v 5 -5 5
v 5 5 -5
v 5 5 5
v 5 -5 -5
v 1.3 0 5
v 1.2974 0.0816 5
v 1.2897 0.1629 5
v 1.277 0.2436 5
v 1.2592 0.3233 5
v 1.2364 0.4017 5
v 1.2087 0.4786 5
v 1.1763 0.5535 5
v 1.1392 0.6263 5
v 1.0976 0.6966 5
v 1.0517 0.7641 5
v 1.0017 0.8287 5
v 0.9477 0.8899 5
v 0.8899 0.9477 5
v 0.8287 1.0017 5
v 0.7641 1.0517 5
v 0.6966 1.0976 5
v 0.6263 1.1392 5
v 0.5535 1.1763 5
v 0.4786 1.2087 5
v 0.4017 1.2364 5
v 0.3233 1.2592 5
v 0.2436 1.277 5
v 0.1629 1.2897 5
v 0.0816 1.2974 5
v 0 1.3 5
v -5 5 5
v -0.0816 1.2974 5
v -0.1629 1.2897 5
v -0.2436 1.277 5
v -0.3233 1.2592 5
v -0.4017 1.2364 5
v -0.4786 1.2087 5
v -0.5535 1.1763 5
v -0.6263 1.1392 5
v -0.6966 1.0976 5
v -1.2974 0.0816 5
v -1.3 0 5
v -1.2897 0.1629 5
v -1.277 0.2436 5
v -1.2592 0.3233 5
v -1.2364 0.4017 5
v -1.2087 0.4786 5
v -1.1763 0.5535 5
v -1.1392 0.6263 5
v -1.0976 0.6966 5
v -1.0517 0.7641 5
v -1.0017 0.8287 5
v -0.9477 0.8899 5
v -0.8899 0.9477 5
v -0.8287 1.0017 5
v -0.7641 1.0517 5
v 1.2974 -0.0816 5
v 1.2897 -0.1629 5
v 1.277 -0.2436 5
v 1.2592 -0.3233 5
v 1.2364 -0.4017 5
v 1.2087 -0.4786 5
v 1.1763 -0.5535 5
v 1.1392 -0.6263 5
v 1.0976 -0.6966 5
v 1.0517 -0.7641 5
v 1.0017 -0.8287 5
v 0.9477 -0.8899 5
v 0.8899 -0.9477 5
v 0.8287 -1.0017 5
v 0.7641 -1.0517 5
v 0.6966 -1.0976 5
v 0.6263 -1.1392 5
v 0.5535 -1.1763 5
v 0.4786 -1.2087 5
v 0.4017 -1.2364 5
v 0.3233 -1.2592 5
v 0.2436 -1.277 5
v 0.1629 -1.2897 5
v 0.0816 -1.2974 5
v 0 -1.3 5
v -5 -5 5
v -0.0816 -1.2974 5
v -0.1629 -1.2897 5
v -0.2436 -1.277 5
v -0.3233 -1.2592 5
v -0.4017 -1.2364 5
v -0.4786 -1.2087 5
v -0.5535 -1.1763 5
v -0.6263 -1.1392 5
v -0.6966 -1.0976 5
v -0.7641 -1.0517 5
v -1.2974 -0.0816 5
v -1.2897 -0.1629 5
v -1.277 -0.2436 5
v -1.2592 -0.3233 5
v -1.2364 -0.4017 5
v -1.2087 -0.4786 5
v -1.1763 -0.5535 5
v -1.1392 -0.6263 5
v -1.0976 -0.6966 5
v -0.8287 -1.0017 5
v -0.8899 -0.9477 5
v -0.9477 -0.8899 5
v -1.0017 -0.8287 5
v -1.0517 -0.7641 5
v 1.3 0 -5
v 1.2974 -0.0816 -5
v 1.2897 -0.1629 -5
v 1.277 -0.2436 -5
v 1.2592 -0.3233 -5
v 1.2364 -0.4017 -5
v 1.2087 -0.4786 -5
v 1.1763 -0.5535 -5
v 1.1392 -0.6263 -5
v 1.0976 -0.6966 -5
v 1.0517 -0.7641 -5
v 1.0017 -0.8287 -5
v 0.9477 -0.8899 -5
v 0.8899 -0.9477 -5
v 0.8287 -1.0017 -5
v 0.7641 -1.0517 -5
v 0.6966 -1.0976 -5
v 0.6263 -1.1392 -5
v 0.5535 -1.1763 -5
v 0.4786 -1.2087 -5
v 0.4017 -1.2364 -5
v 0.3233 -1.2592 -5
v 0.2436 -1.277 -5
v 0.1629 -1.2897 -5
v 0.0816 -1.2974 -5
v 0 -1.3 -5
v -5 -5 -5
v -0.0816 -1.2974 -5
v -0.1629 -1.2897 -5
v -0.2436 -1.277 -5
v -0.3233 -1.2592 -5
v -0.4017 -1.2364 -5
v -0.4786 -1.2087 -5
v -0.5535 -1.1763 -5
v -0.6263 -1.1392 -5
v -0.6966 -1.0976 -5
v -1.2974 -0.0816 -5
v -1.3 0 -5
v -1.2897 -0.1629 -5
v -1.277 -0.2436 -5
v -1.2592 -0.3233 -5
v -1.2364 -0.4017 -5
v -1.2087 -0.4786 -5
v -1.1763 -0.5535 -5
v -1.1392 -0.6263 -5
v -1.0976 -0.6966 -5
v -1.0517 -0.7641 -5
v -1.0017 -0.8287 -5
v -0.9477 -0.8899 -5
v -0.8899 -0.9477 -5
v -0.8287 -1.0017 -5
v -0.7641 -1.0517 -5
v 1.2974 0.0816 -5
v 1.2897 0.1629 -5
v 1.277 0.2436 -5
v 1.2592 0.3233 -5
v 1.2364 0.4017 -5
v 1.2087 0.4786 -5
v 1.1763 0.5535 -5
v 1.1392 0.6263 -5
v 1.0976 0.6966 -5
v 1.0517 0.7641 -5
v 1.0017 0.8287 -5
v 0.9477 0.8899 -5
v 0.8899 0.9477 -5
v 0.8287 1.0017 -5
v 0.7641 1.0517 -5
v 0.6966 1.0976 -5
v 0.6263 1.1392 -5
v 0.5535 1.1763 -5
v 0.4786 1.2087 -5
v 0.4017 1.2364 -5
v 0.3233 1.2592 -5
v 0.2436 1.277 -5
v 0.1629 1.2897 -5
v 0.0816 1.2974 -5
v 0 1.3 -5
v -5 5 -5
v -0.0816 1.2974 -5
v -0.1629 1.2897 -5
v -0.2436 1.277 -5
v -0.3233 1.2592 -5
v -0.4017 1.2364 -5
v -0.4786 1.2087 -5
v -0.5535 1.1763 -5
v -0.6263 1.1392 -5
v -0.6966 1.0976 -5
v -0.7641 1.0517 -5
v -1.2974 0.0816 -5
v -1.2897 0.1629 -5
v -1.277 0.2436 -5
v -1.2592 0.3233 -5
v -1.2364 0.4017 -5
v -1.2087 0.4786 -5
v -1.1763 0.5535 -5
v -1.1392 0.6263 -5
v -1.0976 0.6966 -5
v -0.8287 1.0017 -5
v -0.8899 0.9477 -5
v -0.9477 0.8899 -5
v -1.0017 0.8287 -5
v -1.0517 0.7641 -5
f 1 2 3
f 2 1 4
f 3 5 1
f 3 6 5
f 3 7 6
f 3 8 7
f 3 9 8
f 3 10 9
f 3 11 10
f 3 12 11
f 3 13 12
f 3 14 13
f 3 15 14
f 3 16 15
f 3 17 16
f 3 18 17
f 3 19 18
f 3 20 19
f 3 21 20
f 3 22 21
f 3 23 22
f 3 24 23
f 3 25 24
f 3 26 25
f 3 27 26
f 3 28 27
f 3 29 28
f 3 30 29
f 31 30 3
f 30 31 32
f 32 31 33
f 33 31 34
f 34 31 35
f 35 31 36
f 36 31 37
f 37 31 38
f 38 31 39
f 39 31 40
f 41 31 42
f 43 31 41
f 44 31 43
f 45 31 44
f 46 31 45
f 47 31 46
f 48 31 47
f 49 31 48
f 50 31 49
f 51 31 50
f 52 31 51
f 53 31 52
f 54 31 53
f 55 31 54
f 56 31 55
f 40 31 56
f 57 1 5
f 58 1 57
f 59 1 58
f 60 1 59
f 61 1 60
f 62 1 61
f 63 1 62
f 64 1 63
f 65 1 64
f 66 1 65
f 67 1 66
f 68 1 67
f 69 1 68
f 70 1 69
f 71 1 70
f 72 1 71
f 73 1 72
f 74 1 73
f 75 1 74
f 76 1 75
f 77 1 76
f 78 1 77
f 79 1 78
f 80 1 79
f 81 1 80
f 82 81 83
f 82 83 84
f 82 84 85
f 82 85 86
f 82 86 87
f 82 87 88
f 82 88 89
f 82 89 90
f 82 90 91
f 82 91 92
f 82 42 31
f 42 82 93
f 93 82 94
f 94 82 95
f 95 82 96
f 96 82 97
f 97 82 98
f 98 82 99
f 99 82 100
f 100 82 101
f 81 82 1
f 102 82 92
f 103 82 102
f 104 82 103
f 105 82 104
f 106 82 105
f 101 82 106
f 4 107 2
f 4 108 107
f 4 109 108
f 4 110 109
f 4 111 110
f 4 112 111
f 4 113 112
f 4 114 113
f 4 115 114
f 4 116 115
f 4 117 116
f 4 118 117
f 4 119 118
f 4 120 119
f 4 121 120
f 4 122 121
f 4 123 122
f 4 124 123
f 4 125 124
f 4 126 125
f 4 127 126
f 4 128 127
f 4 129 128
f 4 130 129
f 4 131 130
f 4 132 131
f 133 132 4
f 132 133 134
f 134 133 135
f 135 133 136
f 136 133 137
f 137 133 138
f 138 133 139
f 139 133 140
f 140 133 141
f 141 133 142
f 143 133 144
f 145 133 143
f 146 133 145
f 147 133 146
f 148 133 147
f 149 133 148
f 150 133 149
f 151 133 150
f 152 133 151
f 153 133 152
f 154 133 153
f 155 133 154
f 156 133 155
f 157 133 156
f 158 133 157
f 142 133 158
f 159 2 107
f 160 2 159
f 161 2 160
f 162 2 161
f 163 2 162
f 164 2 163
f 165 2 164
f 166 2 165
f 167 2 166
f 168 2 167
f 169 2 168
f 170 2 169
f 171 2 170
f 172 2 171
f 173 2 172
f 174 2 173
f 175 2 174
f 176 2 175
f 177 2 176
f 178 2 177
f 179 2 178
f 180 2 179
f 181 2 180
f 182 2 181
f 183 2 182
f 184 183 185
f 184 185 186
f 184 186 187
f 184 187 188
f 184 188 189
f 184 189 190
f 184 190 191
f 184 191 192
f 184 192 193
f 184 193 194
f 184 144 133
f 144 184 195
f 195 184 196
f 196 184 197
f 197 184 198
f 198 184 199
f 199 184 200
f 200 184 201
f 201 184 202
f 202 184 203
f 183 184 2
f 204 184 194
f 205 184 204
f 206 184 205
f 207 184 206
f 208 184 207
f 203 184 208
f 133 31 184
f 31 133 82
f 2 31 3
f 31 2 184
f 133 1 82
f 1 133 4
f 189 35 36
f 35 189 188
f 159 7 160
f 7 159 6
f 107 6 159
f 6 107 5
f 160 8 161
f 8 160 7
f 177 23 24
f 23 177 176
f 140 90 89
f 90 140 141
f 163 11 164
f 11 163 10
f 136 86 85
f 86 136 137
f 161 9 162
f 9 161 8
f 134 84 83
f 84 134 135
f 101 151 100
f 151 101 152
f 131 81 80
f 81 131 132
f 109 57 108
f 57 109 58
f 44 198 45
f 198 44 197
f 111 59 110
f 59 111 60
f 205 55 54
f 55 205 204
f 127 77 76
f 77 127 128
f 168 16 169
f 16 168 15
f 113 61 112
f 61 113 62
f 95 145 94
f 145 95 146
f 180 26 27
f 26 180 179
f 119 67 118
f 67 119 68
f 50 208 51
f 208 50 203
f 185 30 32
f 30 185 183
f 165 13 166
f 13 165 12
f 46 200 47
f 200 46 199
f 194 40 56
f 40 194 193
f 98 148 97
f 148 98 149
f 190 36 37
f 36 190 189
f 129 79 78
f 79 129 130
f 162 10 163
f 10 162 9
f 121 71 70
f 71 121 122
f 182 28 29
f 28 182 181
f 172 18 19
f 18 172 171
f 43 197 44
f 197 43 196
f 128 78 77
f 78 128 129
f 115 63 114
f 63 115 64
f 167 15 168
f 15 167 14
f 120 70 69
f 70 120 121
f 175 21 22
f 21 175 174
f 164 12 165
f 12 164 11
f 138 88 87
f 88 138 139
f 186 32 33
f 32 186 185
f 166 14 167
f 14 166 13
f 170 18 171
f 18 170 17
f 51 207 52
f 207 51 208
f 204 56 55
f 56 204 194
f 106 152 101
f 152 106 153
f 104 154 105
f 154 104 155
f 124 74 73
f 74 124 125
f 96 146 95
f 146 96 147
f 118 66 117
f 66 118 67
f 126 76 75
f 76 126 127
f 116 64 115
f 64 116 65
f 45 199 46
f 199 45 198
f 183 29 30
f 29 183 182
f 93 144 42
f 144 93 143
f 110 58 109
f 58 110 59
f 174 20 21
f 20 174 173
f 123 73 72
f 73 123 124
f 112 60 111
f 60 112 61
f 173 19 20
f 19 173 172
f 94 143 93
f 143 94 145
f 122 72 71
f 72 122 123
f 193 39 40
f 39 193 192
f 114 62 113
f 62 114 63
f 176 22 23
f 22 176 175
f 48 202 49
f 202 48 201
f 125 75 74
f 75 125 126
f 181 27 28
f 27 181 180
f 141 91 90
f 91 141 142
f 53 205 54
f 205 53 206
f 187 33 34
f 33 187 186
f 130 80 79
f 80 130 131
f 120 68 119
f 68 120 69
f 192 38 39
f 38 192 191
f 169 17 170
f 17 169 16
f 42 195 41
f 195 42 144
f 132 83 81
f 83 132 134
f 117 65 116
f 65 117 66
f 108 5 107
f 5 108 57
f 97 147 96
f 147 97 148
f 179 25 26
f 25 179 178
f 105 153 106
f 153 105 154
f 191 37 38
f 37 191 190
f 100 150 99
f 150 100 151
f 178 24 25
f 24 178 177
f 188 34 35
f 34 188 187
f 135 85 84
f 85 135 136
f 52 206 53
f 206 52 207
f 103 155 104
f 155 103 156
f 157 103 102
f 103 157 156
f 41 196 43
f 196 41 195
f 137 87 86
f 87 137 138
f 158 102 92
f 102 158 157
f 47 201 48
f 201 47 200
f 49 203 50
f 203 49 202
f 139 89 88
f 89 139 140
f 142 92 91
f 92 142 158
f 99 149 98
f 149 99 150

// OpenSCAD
difference()
{ cube( [10,10,10],center =true);
  cylinder( r=1.3,h=20,center=true,$fn=100);
}
